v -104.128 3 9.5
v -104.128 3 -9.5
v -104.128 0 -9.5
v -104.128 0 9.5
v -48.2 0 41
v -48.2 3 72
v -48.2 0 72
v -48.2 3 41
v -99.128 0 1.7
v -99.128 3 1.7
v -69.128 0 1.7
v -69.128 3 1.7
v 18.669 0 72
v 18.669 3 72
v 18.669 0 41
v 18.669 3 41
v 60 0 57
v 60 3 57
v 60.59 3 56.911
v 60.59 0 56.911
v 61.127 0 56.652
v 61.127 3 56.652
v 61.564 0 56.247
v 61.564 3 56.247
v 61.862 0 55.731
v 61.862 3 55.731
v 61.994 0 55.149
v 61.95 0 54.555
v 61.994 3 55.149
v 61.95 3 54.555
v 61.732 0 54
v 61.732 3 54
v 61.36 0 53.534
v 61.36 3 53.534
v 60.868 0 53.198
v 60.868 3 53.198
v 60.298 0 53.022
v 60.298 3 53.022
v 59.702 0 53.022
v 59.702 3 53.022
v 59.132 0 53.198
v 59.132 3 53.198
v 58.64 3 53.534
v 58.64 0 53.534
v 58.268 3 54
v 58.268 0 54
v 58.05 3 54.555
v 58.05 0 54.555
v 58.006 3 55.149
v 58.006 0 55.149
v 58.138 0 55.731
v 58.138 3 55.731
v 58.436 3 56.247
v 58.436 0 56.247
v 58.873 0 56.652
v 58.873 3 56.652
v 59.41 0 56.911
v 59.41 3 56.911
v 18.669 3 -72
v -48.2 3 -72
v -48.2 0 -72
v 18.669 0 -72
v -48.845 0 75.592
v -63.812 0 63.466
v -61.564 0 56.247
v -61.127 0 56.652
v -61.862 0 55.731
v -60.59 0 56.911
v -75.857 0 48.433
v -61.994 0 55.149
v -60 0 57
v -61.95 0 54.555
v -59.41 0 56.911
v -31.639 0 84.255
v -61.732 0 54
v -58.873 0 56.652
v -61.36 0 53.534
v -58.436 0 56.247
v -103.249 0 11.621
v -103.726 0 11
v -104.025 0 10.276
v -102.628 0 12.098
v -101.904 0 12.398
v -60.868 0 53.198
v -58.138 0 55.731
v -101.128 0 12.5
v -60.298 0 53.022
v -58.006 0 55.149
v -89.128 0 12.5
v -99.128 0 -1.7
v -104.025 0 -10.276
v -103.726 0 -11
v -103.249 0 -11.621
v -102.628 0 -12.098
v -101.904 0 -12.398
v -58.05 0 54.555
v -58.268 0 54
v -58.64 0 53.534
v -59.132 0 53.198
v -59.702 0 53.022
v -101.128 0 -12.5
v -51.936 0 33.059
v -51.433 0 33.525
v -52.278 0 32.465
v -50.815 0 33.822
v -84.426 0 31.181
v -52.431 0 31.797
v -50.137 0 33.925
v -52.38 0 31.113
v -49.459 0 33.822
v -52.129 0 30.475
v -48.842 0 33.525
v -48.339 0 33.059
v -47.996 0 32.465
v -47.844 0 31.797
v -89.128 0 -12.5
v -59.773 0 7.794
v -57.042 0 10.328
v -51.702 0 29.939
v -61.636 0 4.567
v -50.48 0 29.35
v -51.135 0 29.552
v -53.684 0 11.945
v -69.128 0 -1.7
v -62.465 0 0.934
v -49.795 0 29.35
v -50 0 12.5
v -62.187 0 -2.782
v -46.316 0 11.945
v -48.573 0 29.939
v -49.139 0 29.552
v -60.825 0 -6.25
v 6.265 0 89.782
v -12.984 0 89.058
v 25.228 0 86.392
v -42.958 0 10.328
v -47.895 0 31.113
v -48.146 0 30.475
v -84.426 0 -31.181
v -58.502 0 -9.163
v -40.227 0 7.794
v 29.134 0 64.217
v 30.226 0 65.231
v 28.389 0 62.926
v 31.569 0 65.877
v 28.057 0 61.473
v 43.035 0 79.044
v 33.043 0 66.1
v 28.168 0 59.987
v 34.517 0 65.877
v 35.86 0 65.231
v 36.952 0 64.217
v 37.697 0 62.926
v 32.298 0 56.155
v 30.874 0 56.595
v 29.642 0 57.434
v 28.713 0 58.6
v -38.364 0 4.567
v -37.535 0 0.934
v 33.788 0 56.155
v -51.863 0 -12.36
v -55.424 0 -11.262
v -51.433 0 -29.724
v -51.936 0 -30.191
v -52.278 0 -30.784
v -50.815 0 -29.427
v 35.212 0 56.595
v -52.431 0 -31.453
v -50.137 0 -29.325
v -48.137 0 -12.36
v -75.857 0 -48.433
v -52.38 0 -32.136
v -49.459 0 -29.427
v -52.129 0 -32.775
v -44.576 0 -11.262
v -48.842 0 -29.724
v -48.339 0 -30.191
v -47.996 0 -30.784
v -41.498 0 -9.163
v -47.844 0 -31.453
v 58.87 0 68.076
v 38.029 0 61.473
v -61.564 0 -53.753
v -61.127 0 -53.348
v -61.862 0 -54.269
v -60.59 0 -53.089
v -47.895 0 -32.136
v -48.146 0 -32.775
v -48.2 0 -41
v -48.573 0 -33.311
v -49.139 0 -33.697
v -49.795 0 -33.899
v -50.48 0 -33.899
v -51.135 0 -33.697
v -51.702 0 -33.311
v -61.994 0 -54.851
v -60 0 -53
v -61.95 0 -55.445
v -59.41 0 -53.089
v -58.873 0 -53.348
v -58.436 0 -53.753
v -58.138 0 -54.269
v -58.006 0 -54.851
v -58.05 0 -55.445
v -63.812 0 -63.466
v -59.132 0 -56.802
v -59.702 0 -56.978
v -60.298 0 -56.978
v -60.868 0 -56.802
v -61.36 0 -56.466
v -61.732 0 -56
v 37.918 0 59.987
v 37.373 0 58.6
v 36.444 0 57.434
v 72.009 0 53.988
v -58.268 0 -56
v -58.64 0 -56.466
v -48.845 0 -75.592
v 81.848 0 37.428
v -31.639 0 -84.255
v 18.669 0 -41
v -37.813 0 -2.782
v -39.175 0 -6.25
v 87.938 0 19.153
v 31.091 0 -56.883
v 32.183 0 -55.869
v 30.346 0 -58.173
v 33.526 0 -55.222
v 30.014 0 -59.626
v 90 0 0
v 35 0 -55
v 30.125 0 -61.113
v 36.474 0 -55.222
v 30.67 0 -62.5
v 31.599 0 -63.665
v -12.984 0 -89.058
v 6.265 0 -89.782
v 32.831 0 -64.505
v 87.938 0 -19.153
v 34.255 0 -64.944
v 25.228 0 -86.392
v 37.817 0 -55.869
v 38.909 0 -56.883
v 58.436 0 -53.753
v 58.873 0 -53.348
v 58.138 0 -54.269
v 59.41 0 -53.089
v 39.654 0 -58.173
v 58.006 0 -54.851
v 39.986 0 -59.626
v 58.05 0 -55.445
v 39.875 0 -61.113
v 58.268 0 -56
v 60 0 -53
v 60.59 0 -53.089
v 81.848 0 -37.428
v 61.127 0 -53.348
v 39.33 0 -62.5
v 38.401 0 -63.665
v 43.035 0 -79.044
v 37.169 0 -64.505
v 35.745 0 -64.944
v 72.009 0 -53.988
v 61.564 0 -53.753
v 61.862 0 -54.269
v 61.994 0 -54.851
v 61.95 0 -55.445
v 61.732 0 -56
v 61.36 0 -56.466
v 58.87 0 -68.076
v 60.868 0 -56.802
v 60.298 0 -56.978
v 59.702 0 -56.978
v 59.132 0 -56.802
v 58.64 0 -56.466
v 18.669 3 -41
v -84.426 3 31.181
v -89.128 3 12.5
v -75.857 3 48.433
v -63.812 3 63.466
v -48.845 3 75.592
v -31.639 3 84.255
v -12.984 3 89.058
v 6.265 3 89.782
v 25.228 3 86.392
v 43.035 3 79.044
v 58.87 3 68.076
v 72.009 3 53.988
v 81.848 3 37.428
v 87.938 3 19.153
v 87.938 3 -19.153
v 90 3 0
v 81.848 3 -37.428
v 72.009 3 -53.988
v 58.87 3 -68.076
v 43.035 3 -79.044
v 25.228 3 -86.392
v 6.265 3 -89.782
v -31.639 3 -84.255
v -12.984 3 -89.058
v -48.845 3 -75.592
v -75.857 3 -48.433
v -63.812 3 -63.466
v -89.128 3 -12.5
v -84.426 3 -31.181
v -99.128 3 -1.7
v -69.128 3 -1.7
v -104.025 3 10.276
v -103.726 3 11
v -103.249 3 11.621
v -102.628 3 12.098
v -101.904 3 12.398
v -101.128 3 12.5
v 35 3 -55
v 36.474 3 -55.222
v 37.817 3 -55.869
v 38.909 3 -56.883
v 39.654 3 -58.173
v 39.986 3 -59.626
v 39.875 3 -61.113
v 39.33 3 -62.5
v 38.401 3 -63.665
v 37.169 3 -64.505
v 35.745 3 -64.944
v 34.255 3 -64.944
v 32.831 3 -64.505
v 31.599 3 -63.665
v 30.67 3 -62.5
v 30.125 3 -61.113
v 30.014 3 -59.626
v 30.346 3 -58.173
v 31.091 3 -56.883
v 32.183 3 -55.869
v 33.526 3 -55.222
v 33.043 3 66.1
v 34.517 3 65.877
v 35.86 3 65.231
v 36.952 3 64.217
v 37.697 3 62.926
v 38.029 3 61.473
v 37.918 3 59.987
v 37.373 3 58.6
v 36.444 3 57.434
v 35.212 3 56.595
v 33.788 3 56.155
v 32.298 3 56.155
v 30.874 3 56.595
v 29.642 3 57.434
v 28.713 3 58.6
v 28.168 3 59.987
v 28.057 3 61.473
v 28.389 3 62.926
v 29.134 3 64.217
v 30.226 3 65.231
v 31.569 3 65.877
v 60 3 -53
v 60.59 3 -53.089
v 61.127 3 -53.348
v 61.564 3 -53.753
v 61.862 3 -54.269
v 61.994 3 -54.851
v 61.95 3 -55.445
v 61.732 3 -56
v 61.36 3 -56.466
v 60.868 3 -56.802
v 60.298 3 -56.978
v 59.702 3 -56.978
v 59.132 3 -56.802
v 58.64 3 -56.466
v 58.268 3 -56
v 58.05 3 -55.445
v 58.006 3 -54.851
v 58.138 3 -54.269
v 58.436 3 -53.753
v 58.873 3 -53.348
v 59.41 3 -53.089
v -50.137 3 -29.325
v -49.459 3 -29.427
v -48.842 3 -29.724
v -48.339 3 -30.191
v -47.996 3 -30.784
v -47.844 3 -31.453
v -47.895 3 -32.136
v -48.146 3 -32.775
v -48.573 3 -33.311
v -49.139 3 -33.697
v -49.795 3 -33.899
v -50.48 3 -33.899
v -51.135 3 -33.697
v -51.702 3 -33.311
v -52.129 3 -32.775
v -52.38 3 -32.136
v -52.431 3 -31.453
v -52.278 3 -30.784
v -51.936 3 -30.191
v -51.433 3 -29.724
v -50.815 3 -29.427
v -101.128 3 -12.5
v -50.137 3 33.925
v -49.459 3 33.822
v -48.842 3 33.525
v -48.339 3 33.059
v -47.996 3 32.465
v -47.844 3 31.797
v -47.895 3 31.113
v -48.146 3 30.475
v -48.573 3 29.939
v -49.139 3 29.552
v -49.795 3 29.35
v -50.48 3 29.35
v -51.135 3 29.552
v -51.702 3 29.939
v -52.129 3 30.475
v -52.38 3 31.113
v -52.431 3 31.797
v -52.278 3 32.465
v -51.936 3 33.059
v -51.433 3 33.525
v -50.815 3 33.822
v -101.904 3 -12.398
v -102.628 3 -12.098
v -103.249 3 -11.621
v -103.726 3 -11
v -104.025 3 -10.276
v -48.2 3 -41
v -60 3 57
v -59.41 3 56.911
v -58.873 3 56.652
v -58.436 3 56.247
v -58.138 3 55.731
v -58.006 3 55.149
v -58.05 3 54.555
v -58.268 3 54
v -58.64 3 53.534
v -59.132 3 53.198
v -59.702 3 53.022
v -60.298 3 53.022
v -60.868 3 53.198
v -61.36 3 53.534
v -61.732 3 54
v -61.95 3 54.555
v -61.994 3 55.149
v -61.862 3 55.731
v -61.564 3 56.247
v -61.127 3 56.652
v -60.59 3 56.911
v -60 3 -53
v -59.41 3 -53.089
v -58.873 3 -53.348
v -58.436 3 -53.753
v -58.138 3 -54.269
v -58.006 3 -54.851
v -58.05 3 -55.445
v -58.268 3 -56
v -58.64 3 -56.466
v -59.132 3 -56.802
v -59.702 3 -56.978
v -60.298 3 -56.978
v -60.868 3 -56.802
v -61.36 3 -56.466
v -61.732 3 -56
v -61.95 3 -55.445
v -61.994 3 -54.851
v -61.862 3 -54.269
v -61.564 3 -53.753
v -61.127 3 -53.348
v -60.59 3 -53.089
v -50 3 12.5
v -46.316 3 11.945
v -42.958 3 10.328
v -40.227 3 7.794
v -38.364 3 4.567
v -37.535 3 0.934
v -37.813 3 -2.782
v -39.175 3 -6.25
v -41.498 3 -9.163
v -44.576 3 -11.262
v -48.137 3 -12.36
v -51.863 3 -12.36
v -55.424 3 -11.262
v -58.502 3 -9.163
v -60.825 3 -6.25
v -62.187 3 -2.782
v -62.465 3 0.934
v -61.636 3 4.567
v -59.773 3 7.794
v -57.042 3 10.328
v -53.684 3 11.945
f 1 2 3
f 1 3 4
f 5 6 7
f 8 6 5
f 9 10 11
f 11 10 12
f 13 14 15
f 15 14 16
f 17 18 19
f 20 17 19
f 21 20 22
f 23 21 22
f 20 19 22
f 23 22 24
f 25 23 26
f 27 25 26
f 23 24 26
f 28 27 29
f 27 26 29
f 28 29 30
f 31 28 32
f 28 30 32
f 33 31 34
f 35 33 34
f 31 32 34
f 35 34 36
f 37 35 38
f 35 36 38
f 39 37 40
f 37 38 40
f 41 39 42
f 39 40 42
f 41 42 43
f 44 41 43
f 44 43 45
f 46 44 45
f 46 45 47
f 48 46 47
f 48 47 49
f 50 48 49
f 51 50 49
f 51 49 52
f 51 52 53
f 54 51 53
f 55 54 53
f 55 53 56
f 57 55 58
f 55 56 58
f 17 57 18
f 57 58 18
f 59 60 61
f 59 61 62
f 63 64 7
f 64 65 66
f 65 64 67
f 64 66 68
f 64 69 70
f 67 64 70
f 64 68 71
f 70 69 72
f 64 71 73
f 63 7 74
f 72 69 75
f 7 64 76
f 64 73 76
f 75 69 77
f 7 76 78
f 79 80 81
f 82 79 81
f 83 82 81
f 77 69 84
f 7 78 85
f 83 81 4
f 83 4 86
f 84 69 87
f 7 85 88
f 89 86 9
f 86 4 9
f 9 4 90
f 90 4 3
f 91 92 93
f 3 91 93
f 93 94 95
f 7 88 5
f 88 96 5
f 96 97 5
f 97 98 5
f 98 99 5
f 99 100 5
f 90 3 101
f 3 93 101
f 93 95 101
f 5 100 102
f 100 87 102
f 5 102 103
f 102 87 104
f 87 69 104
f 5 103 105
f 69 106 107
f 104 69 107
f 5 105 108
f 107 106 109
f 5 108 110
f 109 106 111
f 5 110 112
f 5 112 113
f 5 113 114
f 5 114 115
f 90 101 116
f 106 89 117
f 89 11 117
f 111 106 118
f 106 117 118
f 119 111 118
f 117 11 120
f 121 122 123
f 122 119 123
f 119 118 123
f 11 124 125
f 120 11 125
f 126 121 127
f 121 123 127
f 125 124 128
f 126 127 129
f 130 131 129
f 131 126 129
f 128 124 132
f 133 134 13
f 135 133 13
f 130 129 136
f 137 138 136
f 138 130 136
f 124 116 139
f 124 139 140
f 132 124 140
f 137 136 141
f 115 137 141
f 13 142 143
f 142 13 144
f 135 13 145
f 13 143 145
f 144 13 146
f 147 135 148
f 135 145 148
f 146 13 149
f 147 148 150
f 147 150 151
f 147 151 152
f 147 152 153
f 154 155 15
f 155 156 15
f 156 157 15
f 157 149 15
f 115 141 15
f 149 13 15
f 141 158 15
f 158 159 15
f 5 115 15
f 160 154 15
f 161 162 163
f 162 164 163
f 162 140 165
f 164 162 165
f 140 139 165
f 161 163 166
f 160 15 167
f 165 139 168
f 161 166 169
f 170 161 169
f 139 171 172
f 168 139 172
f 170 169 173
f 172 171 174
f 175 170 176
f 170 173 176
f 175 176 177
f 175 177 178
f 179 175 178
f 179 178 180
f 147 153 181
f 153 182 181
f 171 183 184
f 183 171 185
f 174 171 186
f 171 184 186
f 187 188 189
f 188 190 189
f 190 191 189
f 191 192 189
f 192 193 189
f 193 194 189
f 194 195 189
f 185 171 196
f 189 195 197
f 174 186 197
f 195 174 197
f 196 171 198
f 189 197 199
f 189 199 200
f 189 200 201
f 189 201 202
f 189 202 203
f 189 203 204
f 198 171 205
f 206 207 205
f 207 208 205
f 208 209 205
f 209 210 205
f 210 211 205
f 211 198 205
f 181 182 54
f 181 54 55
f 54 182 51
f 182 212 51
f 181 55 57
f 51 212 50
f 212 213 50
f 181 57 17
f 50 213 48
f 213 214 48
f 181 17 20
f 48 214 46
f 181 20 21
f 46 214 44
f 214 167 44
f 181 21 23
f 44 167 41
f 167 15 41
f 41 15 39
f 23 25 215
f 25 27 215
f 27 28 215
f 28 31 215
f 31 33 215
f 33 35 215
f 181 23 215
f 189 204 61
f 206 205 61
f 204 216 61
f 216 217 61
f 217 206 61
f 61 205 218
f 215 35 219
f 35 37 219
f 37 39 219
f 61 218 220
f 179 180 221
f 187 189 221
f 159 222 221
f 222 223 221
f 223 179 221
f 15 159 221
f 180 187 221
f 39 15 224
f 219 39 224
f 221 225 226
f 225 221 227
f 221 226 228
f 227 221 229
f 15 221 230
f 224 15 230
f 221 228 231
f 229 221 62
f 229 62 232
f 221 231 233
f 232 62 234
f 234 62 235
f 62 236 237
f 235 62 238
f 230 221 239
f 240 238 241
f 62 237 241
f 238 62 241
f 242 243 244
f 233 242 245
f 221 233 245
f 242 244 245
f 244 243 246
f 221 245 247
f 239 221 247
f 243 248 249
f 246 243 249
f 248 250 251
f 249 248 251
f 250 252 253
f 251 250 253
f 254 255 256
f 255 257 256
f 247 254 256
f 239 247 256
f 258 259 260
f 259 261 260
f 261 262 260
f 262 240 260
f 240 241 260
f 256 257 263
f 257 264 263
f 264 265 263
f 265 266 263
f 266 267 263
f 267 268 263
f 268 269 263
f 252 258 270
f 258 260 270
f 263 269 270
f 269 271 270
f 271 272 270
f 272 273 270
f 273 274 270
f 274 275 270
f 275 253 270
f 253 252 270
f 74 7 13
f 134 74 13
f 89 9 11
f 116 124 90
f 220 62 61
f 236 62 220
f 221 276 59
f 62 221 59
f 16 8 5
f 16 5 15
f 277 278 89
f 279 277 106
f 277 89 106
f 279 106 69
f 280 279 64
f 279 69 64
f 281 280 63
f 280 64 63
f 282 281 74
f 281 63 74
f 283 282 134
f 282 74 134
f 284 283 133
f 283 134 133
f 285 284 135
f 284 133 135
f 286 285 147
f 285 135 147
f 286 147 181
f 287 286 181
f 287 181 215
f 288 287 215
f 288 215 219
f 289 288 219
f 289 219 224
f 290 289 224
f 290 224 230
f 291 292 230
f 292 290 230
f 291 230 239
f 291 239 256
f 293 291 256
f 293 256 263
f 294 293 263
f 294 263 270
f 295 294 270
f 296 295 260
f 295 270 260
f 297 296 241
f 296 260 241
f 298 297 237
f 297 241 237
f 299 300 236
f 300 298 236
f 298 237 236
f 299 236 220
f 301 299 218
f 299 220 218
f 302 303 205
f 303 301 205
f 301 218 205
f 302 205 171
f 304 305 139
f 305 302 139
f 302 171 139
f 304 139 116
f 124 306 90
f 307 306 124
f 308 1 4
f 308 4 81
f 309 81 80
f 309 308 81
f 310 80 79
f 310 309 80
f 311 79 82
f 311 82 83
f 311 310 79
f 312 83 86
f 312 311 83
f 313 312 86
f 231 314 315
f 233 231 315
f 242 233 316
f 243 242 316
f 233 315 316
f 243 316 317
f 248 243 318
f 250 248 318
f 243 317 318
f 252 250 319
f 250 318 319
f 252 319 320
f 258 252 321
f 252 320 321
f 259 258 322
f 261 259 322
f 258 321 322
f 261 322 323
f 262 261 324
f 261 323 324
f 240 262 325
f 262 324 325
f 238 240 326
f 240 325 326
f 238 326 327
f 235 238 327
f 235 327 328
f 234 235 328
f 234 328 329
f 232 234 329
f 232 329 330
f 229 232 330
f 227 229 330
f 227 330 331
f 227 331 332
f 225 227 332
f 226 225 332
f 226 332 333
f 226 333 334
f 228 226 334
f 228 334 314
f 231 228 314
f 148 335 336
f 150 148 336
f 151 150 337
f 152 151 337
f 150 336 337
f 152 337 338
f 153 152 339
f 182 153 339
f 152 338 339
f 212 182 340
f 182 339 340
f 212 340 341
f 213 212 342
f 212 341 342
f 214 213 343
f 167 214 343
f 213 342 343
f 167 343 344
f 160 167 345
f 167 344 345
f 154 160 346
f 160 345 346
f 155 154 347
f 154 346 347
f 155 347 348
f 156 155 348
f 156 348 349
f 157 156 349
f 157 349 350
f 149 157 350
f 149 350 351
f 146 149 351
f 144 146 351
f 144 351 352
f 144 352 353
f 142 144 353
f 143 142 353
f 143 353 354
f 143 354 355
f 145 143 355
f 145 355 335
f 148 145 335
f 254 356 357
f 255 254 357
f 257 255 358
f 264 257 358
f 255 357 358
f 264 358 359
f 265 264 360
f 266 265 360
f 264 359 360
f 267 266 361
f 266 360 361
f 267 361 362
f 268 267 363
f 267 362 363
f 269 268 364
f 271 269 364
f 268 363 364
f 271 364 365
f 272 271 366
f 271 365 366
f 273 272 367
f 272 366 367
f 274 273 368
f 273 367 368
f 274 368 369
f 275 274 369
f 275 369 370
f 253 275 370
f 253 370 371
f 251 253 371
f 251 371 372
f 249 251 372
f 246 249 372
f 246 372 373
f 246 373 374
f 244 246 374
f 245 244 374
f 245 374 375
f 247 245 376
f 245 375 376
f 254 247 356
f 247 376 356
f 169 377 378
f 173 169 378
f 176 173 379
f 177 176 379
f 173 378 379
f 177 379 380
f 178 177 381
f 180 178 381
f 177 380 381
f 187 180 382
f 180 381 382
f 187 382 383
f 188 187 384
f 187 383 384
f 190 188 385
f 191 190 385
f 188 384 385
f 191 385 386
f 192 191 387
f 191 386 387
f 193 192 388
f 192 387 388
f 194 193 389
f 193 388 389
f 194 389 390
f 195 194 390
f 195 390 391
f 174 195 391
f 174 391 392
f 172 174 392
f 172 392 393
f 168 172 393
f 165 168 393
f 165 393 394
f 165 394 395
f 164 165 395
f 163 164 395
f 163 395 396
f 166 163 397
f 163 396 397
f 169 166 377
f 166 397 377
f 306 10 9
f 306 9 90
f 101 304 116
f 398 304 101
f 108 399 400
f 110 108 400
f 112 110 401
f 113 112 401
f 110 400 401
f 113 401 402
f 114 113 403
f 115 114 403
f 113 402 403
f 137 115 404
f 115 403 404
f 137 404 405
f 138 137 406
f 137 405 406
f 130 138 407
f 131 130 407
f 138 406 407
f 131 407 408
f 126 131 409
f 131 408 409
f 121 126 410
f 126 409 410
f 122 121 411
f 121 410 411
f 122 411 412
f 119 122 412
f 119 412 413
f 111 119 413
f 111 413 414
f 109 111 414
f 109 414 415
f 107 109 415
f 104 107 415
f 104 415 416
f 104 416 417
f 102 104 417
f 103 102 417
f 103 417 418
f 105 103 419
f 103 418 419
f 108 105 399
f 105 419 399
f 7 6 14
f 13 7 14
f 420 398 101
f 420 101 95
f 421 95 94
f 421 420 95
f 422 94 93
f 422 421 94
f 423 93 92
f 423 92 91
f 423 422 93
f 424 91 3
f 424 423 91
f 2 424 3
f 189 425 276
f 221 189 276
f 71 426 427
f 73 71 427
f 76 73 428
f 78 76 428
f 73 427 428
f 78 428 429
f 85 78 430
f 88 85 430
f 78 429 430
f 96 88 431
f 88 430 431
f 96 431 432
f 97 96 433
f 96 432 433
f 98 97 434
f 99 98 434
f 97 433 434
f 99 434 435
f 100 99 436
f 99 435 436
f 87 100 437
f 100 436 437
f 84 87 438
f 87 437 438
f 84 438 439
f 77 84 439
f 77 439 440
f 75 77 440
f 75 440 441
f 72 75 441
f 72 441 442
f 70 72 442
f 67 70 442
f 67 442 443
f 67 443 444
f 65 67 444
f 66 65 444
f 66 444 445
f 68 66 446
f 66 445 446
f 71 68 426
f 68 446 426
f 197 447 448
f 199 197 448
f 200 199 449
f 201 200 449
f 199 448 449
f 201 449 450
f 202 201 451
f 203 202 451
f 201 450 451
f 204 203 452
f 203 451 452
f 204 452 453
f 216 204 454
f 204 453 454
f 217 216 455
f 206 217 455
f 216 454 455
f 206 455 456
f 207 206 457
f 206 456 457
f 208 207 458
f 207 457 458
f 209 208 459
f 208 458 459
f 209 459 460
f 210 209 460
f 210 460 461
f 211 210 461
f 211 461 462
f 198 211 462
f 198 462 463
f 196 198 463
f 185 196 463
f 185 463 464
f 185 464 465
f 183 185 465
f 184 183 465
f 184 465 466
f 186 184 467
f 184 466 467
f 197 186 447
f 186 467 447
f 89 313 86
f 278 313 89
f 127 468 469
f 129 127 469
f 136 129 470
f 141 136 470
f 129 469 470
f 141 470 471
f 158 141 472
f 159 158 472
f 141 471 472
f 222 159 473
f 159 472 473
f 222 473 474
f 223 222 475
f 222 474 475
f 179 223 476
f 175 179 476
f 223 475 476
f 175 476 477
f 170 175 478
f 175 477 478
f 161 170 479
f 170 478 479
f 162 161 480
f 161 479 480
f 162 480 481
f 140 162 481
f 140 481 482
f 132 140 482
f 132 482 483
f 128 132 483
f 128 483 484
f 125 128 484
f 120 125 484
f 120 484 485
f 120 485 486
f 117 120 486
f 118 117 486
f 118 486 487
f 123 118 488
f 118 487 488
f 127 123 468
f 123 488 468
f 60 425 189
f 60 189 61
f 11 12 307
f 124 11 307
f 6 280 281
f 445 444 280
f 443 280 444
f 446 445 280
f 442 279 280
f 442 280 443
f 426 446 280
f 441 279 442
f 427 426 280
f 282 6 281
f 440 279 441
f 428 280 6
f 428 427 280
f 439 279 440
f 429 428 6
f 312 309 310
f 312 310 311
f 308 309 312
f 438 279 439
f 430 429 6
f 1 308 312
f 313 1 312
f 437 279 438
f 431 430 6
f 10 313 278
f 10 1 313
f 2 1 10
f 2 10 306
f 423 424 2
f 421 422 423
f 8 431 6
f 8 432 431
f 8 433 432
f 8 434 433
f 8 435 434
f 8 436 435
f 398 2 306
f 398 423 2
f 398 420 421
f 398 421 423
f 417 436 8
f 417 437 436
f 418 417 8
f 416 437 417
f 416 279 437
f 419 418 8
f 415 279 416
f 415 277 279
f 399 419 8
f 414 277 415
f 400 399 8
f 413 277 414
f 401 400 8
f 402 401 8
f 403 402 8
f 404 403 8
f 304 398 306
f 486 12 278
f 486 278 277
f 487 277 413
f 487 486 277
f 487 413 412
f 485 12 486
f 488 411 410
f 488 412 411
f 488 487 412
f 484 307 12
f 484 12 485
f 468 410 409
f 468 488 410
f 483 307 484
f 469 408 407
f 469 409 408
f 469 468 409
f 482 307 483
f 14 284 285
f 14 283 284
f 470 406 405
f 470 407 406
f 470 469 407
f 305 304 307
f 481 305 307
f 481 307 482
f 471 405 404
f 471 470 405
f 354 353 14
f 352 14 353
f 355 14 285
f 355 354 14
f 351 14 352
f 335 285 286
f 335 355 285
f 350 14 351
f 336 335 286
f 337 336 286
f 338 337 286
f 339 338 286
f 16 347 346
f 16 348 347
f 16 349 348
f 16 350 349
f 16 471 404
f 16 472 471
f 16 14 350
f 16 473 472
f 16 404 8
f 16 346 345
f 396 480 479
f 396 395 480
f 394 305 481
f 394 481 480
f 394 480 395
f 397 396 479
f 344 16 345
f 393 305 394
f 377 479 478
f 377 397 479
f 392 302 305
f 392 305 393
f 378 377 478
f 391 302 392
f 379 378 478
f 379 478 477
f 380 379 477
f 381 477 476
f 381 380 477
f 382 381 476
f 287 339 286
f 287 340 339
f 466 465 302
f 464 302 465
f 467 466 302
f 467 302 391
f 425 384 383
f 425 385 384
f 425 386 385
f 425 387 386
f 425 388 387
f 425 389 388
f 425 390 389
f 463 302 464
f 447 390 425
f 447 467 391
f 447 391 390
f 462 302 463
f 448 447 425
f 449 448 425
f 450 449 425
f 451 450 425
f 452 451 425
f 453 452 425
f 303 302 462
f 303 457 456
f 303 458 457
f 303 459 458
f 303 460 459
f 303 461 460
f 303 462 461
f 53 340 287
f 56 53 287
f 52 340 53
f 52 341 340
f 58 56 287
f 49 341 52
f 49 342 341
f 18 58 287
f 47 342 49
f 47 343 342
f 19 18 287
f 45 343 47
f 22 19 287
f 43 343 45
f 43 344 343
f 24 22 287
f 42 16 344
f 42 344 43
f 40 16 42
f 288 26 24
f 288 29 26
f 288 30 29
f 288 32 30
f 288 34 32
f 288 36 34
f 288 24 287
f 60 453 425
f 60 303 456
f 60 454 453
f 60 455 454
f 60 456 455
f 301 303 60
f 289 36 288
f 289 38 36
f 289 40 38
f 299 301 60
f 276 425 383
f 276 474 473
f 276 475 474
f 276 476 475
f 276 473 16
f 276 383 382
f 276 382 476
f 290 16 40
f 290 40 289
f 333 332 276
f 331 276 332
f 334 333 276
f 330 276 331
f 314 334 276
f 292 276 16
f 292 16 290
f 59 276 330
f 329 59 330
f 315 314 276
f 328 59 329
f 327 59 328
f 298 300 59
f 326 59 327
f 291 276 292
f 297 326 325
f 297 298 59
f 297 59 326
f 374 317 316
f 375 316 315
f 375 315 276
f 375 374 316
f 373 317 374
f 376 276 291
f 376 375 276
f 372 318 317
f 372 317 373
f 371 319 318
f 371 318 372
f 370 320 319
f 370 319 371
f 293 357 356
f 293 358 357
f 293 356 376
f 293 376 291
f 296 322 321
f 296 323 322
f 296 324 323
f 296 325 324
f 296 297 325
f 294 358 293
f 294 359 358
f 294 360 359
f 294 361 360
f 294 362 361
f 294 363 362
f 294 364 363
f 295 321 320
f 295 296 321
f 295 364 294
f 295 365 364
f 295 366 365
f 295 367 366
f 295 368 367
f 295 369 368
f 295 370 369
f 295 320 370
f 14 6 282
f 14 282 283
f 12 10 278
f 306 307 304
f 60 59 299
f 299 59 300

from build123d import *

# Parameters (mm, degrees)
SKETCH_2_R          = 90
EXTRUDE_1_DEPTH     = 3
SKETCH_3_W          = 66.868711174
SKETCH_3_H          = 31
CUT_EXTRUDE_1_DEPTH = 3
SKETCH_4_R          = 12.5
CUT_EXTRUDE_2_DEPTH = 3
SKETCH_5_R          = 2
CUT_EXTRUDE_3_DEPTH = 3
SKETCH_6_R          = 5
CUT_EXTRUDE_4_DEPTH = 10
SKETCH_7_R          = 2.3
CUT_EXTRUDE_5_DEPTH = 3
EXTRUDE_2_DEPTH     = 3
SKETCH_9_W          = 30
SKETCH_9_H          = 3.4
CUT_EXTRUDE_6_DEPTH = 3


with BuildPart() as part:
    # 草圖2 → 填料-伸長1 (new body)
    with BuildSketch(Plane(origin=(0, 0, 0), x_dir=(1, 0, 0), z_dir=(0, 1, 0))):
        with Locations(Location((0, 0, 0), (0, 0, 270))):
            Circle(SKETCH_2_R)
    extrude(amount=EXTRUDE_1_DEPTH)

    # 草圖3 → 除料-伸長1 (cut)
    with BuildSketch(Plane(origin=(0, 3, 0), x_dir=(1, 0, 0), z_dir=(0, 1, 0))):
        with Locations((-14.765632174, 56.5)):
            Rectangle(SKETCH_3_W, SKETCH_3_H)
        with Locations((-14.765632174, -56.5)):
            Rectangle(SKETCH_3_W, SKETCH_3_H)
    extrude(amount=-CUT_EXTRUDE_1_DEPTH, mode=Mode.SUBTRACT)

    # 草圖4 → 除料-伸長2 (cut)
    with BuildSketch(Plane(origin=(0, 3, 0), x_dir=(1, 0, 0), z_dir=(0, 1, 0))):
        with Locations(Location((-50, 0, 0), (0, 0, 270))):
            Circle(SKETCH_4_R)
    extrude(amount=-CUT_EXTRUDE_2_DEPTH, mode=Mode.SUBTRACT)

    # 草圖5 → 除料-伸長3 (cut)
    with BuildSketch(Plane(origin=(0, 3, 0), x_dir=(1, 0, 0), z_dir=(0, 1, 0))):
        with Locations(Location((-60, 55, 0), (0, 0, 270))):
            Circle(SKETCH_5_R)
        with Locations(Location((-60, -55, 0), (0, 0, 270))):
            Circle(SKETCH_5_R)
        with Locations(Location((60, -55, 0), (0, 0, 270))):
            Circle(SKETCH_5_R)
        with Locations(Location((60, 55, 0), (0, 0, 270))):
            Circle(SKETCH_5_R)
    extrude(amount=-CUT_EXTRUDE_3_DEPTH, mode=Mode.SUBTRACT)

    # 草圖6 → 除料-伸長4 (cut)
    with BuildSketch(Plane(origin=(0, 3, 0), x_dir=(1, 0, 0), z_dir=(0, 1, 0))):
        with Locations(Location((35, 60, 0), (0, 0, 270))):
            Circle(SKETCH_6_R)
        with Locations(Location((33.043068023, -61.099555282, 0), (0, 0, 270))):
            Circle(SKETCH_6_R)
    extrude(amount=-CUT_EXTRUDE_4_DEPTH, mode=Mode.SUBTRACT)

    # 草圖7 → 除料-伸長5 (cut)
    with BuildSketch(Plane(origin=(0, 3, 0), x_dir=(1, 0, 0), z_dir=(0, 1, 0))):
        with Locations(Location((-50.137404534, -31.624669079, 0), (0, 0, 270))):
            Circle(SKETCH_7_R)
        with Locations(Location((-50.137404534, 31.624669079, 0), (0, 0, 270))):
            Circle(SKETCH_7_R)
    extrude(amount=-CUT_EXTRUDE_5_DEPTH, mode=Mode.SUBTRACT)

    # 草圖8 → 填料-伸長2 (add)
    with BuildSketch(Plane(origin=(0, 3, 0), x_dir=(1, 0, 0), z_dir=(0, 1, 0))):
        with BuildLine():
            Line((-89.12771735, 12.5), (-101.12771735, 12.5))
            ThreePointArc((-101.12771735, 12.5), (-103.249037693, 11.621320344), (-104.12771735, 9.5))
            Line((-104.12771735, 9.5), (-104.12771735, -9.5))
            ThreePointArc((-104.12771735, -9.5), (-103.249037693, -11.621320344), (-101.12771735, -12.5))
            Line((-101.12771735, -12.5), (-89.12771735, -12.5))
            Line((-89.12771735, -12.5), (-89.12771735, 12.5))
        make_face()
    extrude(amount=-EXTRUDE_2_DEPTH)

    # 草圖9 → 除料-伸長6 (cut)
    with BuildSketch(Plane(origin=(0, 3, 0), x_dir=(1, 0, 0), z_dir=(0, 1, 0))):
        with Locations((-84.12771735, 0)):
            Rectangle(SKETCH_9_W, SKETCH_9_H)
    extrude(amount=-CUT_EXTRUDE_6_DEPTH, mode=Mode.SUBTRACT)


solid = part.part
